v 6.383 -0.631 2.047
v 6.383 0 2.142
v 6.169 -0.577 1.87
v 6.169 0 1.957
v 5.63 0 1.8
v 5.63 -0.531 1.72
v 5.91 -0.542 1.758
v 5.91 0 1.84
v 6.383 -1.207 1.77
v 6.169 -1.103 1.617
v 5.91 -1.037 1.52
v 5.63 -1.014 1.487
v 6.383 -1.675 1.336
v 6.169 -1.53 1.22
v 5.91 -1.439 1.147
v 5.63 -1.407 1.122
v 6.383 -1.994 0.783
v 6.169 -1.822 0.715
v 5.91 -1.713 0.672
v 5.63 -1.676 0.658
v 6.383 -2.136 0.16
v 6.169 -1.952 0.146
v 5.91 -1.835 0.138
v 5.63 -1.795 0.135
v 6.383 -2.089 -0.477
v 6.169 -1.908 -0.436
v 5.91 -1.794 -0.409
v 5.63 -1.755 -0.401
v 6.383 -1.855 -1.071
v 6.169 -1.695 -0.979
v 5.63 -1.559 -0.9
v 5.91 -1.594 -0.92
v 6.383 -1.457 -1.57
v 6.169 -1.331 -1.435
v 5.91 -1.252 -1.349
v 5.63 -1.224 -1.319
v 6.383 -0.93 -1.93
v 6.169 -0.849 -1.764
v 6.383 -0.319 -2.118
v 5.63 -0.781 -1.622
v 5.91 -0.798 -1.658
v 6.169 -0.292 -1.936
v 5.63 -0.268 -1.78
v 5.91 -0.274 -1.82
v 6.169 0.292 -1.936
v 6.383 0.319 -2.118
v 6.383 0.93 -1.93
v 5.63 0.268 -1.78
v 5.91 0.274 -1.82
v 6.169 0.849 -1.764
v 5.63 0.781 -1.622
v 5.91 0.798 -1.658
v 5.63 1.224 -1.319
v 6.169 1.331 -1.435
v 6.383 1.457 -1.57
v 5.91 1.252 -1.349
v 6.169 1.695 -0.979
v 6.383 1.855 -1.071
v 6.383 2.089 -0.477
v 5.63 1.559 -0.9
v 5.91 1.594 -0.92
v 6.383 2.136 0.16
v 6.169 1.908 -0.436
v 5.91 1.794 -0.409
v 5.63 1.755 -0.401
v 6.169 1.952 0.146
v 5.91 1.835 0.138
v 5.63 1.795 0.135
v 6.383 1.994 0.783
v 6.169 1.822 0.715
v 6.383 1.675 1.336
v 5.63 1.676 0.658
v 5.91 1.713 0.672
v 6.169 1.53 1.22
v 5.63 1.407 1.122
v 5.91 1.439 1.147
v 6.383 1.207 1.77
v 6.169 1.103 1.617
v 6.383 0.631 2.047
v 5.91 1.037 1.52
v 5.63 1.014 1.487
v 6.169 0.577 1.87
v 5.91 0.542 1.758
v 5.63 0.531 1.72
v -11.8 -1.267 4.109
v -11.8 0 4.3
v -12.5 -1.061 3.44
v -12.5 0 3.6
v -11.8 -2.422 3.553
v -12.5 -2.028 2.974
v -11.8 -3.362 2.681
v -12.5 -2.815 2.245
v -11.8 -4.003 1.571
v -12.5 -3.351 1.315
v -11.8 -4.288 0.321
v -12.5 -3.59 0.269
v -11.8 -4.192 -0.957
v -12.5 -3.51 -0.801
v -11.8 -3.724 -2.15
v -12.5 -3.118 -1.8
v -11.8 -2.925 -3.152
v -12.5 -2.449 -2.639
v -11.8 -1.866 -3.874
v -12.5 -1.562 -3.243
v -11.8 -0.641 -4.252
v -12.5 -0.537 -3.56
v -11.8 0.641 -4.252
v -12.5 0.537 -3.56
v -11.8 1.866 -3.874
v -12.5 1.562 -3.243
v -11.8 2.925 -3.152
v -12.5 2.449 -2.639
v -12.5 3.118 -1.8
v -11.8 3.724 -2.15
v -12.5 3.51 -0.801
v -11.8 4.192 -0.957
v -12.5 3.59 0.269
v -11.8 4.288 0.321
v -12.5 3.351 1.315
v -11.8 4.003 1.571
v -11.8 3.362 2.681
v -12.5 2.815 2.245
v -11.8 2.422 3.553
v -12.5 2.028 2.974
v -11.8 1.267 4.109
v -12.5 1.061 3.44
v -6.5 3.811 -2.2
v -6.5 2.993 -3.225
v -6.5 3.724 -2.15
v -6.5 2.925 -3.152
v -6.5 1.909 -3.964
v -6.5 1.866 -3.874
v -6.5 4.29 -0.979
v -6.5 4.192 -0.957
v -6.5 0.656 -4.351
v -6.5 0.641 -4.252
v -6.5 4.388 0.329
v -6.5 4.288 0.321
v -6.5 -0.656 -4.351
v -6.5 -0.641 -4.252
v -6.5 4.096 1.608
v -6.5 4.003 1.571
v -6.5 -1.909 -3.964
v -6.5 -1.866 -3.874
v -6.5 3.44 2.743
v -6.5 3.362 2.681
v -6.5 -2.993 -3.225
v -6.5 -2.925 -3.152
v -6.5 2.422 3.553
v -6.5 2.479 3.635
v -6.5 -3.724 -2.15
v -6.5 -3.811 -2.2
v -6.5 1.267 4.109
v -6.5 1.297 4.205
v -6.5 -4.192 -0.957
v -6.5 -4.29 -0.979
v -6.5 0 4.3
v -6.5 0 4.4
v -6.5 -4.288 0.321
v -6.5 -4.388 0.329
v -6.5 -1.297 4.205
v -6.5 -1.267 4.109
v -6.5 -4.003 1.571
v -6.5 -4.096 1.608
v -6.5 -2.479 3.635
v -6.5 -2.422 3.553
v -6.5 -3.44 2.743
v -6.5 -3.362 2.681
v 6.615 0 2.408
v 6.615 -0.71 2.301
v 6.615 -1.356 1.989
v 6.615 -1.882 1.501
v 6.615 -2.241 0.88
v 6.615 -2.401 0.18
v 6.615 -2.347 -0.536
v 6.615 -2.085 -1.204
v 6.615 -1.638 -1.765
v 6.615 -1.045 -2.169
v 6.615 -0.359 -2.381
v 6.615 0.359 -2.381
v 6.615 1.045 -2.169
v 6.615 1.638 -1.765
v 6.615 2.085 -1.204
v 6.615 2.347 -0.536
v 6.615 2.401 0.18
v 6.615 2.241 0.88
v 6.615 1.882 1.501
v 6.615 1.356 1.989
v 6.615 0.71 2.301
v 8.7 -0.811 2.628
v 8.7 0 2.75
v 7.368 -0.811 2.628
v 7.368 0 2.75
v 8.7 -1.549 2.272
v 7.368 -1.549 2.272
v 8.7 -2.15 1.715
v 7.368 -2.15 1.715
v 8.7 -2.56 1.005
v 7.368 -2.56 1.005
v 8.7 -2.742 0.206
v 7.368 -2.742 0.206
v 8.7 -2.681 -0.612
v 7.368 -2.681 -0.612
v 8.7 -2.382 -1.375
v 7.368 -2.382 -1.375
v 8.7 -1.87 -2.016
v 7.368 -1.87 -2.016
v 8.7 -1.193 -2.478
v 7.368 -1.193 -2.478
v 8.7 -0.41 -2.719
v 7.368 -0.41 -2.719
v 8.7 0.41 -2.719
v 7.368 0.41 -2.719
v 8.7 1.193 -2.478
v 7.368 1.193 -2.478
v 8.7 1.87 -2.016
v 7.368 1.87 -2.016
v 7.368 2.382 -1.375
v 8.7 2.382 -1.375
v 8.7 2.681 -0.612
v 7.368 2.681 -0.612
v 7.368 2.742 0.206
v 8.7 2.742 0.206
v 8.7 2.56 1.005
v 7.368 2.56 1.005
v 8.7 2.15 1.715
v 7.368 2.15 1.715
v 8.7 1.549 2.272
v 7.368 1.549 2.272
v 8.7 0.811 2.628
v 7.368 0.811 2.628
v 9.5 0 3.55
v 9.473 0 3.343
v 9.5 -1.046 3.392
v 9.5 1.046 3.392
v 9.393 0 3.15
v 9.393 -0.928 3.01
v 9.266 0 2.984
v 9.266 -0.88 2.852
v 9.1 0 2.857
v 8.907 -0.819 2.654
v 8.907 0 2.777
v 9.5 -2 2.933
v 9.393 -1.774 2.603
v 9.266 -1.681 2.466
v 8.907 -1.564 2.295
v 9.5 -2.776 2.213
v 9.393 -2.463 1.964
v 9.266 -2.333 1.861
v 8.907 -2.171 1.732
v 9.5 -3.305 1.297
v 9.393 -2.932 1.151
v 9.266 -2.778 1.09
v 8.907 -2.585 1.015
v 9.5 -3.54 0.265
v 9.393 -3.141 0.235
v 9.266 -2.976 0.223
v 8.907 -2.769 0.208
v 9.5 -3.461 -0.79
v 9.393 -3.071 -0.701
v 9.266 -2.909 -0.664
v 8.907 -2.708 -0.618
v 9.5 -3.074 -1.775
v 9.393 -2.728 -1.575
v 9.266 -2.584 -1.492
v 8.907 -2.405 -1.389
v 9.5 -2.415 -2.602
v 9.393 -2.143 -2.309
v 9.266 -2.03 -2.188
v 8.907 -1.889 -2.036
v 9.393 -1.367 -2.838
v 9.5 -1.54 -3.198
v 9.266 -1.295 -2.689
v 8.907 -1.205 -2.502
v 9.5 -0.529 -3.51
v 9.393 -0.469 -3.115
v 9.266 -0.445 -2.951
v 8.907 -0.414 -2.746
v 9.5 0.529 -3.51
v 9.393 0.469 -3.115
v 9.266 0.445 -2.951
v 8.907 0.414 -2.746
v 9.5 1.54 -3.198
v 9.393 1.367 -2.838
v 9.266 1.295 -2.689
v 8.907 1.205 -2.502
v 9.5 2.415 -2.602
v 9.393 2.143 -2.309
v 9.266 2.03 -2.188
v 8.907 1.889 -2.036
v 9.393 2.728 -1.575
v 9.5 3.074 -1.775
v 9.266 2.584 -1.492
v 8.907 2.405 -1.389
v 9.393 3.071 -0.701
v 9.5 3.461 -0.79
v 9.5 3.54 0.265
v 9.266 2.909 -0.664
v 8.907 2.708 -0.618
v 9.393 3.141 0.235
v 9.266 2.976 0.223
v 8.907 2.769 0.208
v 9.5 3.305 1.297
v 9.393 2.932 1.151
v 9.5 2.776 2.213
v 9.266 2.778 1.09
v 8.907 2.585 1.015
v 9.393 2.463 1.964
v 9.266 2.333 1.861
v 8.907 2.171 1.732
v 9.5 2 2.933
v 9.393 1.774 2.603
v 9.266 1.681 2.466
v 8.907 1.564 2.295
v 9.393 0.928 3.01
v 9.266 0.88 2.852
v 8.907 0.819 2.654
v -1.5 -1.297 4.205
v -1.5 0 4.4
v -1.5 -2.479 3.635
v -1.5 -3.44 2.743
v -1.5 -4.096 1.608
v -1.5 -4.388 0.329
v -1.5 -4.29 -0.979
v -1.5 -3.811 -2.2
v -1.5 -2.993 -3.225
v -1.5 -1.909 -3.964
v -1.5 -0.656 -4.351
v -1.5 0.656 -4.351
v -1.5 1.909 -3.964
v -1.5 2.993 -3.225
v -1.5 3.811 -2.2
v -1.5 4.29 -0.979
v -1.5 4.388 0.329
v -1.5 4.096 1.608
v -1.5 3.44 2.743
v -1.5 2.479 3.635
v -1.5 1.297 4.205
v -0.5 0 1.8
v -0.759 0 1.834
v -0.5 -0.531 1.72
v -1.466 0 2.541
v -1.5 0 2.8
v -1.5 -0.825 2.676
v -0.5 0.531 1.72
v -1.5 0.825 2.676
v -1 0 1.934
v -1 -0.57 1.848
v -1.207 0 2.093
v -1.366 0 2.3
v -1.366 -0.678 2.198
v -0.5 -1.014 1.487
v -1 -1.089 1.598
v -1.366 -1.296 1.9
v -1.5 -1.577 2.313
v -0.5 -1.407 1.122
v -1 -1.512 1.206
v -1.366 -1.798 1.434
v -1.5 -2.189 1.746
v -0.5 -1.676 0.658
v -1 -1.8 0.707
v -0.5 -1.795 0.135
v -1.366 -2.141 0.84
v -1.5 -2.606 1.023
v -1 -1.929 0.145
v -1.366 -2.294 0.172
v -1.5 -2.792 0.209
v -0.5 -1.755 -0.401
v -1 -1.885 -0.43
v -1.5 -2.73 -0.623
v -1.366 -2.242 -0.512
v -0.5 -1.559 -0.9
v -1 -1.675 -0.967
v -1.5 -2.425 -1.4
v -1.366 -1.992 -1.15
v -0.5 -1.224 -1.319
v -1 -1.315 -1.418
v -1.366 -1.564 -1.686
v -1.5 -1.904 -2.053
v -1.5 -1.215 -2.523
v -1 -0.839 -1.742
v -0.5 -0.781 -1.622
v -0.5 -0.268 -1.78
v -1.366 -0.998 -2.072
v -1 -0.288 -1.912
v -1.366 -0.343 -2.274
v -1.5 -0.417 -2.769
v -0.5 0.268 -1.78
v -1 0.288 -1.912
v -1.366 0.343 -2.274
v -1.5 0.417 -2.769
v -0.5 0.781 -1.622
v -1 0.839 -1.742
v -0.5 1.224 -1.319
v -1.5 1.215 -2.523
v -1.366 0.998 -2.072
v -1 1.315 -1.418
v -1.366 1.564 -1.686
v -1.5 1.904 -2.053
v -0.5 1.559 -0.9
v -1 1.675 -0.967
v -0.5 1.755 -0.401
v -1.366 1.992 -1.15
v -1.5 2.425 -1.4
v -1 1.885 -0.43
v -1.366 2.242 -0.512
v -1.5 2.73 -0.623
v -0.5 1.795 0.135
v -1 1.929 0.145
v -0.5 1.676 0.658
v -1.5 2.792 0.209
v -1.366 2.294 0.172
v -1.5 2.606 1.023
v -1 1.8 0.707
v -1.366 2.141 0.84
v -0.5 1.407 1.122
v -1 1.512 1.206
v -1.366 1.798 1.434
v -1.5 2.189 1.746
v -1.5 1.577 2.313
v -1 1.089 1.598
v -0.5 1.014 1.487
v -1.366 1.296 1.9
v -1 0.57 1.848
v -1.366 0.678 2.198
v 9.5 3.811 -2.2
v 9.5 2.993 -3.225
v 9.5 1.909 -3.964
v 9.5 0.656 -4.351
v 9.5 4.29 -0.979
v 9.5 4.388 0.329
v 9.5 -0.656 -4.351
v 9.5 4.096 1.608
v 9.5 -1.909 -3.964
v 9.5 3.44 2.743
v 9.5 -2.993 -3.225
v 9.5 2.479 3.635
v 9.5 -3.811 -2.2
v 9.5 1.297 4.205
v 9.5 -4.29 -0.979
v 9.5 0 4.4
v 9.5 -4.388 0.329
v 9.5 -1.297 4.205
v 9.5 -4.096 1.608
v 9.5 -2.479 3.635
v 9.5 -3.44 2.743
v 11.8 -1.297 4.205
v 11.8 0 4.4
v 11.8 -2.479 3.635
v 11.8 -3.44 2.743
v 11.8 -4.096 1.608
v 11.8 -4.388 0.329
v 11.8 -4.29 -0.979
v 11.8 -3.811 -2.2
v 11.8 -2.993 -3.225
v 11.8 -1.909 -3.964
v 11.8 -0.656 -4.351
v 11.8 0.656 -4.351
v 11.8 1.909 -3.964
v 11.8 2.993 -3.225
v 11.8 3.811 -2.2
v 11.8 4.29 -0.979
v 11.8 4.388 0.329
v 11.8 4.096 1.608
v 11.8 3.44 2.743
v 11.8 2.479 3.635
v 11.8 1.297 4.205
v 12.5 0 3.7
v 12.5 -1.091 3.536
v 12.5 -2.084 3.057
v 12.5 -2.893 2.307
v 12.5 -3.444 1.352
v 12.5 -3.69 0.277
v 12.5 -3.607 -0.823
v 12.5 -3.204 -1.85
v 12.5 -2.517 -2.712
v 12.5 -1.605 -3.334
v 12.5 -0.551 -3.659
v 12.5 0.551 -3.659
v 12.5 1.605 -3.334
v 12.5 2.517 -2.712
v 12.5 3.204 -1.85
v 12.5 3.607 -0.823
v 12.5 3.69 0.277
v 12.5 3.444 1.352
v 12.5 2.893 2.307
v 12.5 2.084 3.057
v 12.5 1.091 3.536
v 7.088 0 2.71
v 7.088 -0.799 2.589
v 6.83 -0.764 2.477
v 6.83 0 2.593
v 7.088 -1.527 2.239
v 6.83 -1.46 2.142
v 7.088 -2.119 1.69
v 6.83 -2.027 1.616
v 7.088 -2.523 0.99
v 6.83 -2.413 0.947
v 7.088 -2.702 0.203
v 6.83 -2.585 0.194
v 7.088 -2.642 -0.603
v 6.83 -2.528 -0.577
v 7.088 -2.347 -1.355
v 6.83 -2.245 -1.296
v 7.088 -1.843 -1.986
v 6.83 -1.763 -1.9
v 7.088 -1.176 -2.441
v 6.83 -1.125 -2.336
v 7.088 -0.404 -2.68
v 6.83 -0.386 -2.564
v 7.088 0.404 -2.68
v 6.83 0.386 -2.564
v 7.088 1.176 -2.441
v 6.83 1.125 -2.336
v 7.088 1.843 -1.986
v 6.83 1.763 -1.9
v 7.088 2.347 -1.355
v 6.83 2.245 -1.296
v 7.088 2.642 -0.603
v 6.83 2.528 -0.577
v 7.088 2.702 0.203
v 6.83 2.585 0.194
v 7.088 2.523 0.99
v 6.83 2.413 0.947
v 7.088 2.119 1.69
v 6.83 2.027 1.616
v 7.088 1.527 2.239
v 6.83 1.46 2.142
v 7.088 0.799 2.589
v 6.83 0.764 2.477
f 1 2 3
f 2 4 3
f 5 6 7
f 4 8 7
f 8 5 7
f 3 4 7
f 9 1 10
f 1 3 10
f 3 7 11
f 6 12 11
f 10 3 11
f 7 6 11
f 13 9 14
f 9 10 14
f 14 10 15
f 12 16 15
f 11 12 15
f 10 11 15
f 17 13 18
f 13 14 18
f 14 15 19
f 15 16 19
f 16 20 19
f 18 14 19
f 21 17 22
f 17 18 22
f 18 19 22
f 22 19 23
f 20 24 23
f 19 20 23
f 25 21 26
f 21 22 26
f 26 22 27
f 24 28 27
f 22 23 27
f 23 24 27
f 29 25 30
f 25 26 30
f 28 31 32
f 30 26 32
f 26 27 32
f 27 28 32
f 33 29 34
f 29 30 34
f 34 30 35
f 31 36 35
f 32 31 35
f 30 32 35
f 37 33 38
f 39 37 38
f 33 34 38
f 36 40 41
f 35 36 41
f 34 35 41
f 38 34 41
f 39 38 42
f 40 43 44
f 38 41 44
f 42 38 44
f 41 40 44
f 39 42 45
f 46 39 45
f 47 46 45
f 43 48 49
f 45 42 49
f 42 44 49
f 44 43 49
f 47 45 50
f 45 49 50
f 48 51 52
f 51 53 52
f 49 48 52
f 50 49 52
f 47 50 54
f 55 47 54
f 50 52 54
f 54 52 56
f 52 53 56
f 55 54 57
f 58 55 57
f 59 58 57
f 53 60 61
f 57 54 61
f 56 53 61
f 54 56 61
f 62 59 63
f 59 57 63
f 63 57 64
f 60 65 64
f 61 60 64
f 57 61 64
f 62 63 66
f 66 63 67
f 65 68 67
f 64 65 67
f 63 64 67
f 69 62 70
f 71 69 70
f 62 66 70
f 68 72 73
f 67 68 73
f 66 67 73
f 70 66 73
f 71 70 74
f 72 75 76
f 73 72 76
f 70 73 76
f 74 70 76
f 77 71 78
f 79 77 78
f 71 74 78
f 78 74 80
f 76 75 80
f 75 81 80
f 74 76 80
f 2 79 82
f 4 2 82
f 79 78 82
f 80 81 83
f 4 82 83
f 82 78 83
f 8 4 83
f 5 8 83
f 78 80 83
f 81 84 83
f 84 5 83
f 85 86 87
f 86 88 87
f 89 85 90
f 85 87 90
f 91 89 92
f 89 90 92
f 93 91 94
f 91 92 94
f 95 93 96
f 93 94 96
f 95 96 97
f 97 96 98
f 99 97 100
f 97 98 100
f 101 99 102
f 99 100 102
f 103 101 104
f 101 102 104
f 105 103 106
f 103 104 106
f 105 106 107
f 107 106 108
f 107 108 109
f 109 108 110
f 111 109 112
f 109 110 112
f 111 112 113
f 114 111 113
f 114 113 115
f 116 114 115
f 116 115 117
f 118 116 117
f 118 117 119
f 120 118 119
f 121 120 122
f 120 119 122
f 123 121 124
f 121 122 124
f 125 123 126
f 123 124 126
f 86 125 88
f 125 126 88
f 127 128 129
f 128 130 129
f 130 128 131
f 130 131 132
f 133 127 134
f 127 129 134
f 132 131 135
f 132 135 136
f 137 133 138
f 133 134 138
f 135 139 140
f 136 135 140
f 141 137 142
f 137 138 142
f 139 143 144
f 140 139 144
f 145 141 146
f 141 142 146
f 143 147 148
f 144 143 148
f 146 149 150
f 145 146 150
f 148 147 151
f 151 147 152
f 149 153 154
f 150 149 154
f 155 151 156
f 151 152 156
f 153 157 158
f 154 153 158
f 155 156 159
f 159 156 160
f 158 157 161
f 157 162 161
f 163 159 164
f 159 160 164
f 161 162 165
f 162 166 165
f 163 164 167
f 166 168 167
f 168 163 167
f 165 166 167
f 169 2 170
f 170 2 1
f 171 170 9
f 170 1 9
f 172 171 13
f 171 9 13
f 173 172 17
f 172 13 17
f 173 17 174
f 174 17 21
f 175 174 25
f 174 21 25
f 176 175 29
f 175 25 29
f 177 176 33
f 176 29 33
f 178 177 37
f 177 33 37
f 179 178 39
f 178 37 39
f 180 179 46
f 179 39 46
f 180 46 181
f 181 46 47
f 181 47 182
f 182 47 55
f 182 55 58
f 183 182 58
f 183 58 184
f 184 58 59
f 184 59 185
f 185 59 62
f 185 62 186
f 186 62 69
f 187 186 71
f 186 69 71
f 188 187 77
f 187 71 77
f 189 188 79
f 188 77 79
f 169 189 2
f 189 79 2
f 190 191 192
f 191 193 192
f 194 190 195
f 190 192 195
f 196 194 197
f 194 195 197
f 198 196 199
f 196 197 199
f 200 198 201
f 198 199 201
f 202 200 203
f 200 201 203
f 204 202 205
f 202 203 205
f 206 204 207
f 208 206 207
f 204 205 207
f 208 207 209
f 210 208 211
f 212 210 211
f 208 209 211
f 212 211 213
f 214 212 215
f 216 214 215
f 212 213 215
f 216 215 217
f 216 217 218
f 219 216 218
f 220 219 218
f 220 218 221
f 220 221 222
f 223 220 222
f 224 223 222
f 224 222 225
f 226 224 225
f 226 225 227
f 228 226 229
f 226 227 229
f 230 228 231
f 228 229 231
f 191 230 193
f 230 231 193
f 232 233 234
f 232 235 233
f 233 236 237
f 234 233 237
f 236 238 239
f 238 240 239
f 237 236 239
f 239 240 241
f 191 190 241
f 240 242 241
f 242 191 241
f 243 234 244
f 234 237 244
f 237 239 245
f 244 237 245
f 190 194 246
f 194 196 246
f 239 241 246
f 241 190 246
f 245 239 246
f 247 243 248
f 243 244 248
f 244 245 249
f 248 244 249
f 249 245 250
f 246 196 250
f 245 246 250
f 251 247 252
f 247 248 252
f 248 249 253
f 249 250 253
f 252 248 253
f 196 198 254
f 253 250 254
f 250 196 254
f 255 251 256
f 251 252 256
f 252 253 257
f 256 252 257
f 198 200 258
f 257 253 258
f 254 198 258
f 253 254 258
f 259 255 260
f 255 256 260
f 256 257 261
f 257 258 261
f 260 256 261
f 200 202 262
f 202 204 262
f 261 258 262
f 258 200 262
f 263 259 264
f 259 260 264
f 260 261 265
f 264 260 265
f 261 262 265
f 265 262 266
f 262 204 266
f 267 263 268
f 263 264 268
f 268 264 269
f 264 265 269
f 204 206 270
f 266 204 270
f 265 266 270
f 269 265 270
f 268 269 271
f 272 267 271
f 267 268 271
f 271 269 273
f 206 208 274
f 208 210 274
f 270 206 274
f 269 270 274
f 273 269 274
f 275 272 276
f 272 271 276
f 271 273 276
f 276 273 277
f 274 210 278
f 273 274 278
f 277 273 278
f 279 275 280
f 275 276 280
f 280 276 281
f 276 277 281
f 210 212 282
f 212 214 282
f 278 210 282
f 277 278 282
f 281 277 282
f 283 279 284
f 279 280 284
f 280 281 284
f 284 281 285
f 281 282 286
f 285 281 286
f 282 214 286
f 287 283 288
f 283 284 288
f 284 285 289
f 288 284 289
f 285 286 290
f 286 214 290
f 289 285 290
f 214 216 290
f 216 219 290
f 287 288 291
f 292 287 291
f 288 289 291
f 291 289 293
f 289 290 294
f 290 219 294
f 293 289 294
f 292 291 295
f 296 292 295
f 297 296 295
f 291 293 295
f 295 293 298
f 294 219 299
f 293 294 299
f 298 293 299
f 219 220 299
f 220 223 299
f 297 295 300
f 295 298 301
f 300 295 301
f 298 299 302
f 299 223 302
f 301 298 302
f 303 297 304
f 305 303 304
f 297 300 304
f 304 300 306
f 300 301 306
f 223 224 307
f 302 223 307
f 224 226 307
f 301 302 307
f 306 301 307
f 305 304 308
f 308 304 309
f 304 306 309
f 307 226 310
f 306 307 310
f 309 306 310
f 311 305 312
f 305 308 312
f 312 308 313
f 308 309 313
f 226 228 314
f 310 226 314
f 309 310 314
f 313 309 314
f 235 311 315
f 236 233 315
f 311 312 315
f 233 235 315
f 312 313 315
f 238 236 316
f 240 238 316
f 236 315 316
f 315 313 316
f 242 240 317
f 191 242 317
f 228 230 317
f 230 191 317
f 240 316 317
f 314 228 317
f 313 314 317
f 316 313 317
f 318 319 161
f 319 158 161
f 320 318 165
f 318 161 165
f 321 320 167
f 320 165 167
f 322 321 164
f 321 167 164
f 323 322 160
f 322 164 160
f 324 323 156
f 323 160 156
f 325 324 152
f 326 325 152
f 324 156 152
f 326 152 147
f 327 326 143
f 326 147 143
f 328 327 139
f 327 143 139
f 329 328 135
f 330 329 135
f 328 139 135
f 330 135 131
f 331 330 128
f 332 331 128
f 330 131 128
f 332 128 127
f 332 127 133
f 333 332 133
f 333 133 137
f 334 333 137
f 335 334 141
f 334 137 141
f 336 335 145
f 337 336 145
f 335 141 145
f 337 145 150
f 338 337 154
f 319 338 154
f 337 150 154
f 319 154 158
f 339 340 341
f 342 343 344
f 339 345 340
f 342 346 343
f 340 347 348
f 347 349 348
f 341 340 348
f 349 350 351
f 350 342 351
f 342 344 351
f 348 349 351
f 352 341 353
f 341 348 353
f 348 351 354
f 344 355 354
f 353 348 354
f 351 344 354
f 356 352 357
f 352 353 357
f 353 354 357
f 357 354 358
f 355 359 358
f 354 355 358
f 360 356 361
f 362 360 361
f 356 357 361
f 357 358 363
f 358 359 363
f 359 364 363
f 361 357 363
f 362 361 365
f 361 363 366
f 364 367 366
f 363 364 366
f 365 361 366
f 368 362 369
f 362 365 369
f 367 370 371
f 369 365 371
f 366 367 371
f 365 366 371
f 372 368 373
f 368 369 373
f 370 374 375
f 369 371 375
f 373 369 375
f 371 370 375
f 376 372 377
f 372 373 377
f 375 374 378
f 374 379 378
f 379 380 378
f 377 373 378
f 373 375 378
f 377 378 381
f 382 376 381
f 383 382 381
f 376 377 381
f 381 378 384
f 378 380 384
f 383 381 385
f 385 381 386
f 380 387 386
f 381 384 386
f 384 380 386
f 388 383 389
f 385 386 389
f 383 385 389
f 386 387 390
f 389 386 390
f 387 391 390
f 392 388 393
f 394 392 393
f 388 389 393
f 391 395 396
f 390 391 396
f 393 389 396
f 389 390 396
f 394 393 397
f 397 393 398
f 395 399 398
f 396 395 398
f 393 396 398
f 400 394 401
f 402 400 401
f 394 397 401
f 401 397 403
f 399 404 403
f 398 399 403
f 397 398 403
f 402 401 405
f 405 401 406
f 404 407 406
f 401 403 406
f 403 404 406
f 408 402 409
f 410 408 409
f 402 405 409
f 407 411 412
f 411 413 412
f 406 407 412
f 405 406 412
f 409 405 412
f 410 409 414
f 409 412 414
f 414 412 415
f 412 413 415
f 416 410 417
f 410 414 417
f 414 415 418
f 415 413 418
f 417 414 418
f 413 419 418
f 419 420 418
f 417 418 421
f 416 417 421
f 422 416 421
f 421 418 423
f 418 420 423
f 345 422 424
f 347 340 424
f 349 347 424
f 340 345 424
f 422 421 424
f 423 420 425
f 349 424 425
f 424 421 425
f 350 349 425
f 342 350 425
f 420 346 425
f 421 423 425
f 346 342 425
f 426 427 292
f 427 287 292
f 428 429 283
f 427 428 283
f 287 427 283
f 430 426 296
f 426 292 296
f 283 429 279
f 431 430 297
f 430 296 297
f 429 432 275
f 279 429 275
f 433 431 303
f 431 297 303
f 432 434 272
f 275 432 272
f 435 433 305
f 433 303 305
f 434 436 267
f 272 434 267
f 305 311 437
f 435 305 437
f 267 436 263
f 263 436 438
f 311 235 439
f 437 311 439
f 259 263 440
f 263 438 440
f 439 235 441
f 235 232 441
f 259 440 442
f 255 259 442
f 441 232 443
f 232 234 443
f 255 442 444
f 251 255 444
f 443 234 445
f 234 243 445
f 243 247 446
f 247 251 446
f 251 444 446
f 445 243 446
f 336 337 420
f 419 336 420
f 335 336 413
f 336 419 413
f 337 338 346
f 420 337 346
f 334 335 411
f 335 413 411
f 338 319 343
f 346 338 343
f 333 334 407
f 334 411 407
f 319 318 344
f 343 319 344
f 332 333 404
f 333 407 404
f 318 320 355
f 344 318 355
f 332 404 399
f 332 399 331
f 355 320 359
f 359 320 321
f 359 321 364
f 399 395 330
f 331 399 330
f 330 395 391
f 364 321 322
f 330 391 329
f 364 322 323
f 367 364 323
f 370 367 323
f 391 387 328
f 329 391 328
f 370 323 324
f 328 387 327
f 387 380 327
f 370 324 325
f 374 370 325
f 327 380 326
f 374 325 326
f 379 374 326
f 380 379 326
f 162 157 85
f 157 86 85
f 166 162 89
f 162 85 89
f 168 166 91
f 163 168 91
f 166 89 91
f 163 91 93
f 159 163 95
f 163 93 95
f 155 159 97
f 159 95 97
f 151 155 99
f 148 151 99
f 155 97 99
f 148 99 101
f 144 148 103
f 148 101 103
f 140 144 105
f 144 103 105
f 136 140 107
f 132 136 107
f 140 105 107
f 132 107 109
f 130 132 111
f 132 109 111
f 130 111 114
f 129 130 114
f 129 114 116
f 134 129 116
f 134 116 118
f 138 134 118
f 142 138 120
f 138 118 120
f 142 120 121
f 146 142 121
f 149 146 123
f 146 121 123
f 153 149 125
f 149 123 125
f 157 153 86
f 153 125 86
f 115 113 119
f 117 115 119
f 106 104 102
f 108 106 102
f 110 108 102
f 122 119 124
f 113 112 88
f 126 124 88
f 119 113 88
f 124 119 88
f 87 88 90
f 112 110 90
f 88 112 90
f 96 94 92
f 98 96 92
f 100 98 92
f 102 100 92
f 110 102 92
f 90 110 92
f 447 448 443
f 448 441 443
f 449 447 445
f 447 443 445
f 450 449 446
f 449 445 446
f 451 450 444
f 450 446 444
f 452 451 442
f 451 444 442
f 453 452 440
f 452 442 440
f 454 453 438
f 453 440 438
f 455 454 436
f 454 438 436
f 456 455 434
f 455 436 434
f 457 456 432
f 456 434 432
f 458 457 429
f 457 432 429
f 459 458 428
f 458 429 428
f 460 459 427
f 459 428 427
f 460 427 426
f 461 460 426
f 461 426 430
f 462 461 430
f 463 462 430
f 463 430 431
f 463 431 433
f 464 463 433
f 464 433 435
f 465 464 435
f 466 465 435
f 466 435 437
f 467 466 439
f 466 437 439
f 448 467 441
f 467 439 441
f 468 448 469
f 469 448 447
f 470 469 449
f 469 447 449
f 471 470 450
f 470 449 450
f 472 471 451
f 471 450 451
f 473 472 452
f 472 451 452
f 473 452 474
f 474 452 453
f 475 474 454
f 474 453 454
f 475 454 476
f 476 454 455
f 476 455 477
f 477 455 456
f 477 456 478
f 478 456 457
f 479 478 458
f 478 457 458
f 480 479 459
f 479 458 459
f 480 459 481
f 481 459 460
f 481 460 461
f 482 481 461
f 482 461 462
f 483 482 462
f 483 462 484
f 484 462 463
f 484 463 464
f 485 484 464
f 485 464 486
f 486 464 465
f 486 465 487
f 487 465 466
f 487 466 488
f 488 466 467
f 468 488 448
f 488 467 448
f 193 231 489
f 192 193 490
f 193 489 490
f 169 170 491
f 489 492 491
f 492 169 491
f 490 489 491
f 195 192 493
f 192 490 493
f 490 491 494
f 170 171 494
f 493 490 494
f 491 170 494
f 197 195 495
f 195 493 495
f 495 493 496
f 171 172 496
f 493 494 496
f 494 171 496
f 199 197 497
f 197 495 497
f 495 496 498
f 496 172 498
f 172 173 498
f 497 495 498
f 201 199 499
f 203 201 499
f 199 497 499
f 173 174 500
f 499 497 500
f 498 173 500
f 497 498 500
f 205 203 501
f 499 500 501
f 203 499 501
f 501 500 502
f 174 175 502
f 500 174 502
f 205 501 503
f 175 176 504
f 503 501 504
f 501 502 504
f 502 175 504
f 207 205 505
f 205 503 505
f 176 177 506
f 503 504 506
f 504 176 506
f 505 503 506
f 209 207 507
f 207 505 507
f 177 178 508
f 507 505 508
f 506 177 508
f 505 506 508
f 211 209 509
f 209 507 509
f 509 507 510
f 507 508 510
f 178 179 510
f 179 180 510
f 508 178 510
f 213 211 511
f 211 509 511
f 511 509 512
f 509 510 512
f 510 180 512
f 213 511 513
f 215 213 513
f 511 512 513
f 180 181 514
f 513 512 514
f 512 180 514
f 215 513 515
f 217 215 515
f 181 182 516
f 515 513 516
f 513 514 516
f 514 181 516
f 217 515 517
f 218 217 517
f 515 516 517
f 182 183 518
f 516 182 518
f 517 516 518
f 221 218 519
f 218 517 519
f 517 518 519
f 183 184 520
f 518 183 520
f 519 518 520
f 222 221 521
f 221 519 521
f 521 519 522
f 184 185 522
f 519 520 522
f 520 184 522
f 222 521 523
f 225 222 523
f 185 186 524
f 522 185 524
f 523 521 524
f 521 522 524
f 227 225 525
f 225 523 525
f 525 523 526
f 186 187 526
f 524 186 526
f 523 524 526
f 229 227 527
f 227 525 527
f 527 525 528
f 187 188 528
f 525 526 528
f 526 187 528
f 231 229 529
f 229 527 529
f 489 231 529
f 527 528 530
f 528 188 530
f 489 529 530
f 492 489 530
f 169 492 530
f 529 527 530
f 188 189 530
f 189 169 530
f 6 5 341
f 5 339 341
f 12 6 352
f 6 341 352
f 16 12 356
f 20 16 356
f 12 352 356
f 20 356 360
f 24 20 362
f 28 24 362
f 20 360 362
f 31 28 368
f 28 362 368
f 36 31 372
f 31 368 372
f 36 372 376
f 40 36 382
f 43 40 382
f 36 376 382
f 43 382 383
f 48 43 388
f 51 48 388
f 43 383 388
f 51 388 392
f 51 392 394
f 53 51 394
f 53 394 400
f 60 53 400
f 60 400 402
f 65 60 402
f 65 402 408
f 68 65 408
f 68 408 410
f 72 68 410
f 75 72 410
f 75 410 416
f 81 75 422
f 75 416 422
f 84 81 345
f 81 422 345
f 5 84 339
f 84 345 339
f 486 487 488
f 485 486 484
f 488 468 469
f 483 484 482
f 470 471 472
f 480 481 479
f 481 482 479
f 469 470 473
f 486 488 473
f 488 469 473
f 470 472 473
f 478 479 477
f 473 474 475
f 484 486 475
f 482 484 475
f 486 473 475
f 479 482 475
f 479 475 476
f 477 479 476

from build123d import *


with BuildPart() as part:
    # Esquisse1 → Révolution1 (revolve)
    with BuildSketch(Plane.XY):
        with BuildLine():
            Line((-6.5, 4.4), (-6.5, 4.3))
            Line((-6.5, 4.3), (-11.8, 4.3))
            Line((-11.8, 4.3), (-12.5, 3.6))
            Line((-12.5, 3.6), (-12.5, 0))
            Line((-12.5, 0), (12.5, 0))
            Line((12.5, 0), (12.5, 3.7))
            Line((12.5, 3.7), (11.8, 4.4))
            Line((11.8, 4.4), (9.5, 4.4))
            Line((9.5, 4.4), (9.5, 3.55))
            ThreePointArc((9.5, 3.55), (9.265685425, 2.984314575), (8.7, 2.75))
            Line((8.7, 2.75), (7.368165998, 2.75))
            ThreePointArc((7.368165998, 2.75), (6.954414959, 2.660390069), (6.614816325, 2.407620157))
            Line((6.614816325, 2.407620157), (6.383280582, 2.142379843))
            ThreePointArc((6.383280582, 2.142379843), (6.043681947, 1.889609931), (5.629930909, 1.8))
            Line((5.629930909, 1.8), (-0.5, 1.8))
            ThreePointArc((-0.5, 1.8), (-1.207106781, 2.092893219), (-1.5, 2.8))
            Line((-1.5, 2.8), (-1.5, 4.4))
            Line((-1.5, 4.4), (-6.5, 4.4))
        make_face()
    revolve(axis=Axis((-13.47216, 0, 0), (1, 0, 0)))


solid = part.part
